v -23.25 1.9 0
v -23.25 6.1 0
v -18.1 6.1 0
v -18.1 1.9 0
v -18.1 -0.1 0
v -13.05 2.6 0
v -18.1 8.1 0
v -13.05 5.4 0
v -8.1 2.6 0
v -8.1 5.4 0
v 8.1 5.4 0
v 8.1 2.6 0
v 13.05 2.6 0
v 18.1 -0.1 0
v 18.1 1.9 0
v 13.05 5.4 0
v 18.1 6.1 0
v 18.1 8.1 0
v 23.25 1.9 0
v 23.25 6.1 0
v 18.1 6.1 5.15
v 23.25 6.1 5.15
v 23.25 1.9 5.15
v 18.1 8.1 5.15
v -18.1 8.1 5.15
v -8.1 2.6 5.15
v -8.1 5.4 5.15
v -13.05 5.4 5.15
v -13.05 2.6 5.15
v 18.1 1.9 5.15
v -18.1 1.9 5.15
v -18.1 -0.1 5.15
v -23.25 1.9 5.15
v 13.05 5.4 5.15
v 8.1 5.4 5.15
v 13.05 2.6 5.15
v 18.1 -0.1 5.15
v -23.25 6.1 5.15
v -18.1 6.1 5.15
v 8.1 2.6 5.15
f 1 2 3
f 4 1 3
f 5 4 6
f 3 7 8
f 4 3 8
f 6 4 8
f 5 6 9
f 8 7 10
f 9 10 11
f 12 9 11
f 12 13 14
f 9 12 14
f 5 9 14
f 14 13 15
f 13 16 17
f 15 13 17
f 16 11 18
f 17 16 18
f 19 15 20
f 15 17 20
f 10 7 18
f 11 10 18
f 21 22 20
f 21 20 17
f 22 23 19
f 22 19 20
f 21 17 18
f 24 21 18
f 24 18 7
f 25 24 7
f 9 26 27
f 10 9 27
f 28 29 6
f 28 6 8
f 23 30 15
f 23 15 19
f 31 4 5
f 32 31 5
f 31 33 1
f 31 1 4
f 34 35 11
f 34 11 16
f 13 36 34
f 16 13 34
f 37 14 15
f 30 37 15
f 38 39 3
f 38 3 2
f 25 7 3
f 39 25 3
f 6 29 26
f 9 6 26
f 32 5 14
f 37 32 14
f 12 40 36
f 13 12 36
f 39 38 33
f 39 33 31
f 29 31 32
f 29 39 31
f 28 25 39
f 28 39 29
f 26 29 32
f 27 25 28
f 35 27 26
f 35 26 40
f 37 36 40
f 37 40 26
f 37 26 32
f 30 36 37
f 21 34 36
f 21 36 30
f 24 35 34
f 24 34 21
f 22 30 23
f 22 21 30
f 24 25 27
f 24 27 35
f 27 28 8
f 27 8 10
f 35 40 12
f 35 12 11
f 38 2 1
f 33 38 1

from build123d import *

# Parameters (mm, degrees)
BOSS_EXTRUDE1_DEPTH = 5.15
SKETCH2_W           = 4.95
SKETCH2_H           = 2.8
CUT_EXTRUDE1_DEPTH  = 6.15


with BuildPart() as part:
    # Sketch1 → Boss-Extrude1 (new body)
    with BuildSketch(Plane.XY):
        Polygon((-18.1, 1.9), (-18.1, -0.1), (0, -0.1), (18.1, -0.1), (18.1, 1.9), (23.25, 1.9), (23.25, 6.1), (18.1, 6.1), (18.1, 8.1), (-18.1, 8.1), (-18.1, 6.1), (-23.25, 6.1), (-23.25, 1.9), align=None)
    extrude(amount=BOSS_EXTRUDE1_DEPTH)

    # Sketch2 → Cut-Extrude1 (cut, through all)
    with BuildSketch(Plane.XY.offset(5.15)):
        with Locations((-10.575, 4)):
            Rectangle(SKETCH2_W, SKETCH2_H)
        with Locations((10.575, 4)):
            Rectangle(SKETCH2_W, SKETCH2_H)
    extrude(amount=-CUT_EXTRUDE1_DEPTH, mode=Mode.SUBTRACT)


solid = part.part
